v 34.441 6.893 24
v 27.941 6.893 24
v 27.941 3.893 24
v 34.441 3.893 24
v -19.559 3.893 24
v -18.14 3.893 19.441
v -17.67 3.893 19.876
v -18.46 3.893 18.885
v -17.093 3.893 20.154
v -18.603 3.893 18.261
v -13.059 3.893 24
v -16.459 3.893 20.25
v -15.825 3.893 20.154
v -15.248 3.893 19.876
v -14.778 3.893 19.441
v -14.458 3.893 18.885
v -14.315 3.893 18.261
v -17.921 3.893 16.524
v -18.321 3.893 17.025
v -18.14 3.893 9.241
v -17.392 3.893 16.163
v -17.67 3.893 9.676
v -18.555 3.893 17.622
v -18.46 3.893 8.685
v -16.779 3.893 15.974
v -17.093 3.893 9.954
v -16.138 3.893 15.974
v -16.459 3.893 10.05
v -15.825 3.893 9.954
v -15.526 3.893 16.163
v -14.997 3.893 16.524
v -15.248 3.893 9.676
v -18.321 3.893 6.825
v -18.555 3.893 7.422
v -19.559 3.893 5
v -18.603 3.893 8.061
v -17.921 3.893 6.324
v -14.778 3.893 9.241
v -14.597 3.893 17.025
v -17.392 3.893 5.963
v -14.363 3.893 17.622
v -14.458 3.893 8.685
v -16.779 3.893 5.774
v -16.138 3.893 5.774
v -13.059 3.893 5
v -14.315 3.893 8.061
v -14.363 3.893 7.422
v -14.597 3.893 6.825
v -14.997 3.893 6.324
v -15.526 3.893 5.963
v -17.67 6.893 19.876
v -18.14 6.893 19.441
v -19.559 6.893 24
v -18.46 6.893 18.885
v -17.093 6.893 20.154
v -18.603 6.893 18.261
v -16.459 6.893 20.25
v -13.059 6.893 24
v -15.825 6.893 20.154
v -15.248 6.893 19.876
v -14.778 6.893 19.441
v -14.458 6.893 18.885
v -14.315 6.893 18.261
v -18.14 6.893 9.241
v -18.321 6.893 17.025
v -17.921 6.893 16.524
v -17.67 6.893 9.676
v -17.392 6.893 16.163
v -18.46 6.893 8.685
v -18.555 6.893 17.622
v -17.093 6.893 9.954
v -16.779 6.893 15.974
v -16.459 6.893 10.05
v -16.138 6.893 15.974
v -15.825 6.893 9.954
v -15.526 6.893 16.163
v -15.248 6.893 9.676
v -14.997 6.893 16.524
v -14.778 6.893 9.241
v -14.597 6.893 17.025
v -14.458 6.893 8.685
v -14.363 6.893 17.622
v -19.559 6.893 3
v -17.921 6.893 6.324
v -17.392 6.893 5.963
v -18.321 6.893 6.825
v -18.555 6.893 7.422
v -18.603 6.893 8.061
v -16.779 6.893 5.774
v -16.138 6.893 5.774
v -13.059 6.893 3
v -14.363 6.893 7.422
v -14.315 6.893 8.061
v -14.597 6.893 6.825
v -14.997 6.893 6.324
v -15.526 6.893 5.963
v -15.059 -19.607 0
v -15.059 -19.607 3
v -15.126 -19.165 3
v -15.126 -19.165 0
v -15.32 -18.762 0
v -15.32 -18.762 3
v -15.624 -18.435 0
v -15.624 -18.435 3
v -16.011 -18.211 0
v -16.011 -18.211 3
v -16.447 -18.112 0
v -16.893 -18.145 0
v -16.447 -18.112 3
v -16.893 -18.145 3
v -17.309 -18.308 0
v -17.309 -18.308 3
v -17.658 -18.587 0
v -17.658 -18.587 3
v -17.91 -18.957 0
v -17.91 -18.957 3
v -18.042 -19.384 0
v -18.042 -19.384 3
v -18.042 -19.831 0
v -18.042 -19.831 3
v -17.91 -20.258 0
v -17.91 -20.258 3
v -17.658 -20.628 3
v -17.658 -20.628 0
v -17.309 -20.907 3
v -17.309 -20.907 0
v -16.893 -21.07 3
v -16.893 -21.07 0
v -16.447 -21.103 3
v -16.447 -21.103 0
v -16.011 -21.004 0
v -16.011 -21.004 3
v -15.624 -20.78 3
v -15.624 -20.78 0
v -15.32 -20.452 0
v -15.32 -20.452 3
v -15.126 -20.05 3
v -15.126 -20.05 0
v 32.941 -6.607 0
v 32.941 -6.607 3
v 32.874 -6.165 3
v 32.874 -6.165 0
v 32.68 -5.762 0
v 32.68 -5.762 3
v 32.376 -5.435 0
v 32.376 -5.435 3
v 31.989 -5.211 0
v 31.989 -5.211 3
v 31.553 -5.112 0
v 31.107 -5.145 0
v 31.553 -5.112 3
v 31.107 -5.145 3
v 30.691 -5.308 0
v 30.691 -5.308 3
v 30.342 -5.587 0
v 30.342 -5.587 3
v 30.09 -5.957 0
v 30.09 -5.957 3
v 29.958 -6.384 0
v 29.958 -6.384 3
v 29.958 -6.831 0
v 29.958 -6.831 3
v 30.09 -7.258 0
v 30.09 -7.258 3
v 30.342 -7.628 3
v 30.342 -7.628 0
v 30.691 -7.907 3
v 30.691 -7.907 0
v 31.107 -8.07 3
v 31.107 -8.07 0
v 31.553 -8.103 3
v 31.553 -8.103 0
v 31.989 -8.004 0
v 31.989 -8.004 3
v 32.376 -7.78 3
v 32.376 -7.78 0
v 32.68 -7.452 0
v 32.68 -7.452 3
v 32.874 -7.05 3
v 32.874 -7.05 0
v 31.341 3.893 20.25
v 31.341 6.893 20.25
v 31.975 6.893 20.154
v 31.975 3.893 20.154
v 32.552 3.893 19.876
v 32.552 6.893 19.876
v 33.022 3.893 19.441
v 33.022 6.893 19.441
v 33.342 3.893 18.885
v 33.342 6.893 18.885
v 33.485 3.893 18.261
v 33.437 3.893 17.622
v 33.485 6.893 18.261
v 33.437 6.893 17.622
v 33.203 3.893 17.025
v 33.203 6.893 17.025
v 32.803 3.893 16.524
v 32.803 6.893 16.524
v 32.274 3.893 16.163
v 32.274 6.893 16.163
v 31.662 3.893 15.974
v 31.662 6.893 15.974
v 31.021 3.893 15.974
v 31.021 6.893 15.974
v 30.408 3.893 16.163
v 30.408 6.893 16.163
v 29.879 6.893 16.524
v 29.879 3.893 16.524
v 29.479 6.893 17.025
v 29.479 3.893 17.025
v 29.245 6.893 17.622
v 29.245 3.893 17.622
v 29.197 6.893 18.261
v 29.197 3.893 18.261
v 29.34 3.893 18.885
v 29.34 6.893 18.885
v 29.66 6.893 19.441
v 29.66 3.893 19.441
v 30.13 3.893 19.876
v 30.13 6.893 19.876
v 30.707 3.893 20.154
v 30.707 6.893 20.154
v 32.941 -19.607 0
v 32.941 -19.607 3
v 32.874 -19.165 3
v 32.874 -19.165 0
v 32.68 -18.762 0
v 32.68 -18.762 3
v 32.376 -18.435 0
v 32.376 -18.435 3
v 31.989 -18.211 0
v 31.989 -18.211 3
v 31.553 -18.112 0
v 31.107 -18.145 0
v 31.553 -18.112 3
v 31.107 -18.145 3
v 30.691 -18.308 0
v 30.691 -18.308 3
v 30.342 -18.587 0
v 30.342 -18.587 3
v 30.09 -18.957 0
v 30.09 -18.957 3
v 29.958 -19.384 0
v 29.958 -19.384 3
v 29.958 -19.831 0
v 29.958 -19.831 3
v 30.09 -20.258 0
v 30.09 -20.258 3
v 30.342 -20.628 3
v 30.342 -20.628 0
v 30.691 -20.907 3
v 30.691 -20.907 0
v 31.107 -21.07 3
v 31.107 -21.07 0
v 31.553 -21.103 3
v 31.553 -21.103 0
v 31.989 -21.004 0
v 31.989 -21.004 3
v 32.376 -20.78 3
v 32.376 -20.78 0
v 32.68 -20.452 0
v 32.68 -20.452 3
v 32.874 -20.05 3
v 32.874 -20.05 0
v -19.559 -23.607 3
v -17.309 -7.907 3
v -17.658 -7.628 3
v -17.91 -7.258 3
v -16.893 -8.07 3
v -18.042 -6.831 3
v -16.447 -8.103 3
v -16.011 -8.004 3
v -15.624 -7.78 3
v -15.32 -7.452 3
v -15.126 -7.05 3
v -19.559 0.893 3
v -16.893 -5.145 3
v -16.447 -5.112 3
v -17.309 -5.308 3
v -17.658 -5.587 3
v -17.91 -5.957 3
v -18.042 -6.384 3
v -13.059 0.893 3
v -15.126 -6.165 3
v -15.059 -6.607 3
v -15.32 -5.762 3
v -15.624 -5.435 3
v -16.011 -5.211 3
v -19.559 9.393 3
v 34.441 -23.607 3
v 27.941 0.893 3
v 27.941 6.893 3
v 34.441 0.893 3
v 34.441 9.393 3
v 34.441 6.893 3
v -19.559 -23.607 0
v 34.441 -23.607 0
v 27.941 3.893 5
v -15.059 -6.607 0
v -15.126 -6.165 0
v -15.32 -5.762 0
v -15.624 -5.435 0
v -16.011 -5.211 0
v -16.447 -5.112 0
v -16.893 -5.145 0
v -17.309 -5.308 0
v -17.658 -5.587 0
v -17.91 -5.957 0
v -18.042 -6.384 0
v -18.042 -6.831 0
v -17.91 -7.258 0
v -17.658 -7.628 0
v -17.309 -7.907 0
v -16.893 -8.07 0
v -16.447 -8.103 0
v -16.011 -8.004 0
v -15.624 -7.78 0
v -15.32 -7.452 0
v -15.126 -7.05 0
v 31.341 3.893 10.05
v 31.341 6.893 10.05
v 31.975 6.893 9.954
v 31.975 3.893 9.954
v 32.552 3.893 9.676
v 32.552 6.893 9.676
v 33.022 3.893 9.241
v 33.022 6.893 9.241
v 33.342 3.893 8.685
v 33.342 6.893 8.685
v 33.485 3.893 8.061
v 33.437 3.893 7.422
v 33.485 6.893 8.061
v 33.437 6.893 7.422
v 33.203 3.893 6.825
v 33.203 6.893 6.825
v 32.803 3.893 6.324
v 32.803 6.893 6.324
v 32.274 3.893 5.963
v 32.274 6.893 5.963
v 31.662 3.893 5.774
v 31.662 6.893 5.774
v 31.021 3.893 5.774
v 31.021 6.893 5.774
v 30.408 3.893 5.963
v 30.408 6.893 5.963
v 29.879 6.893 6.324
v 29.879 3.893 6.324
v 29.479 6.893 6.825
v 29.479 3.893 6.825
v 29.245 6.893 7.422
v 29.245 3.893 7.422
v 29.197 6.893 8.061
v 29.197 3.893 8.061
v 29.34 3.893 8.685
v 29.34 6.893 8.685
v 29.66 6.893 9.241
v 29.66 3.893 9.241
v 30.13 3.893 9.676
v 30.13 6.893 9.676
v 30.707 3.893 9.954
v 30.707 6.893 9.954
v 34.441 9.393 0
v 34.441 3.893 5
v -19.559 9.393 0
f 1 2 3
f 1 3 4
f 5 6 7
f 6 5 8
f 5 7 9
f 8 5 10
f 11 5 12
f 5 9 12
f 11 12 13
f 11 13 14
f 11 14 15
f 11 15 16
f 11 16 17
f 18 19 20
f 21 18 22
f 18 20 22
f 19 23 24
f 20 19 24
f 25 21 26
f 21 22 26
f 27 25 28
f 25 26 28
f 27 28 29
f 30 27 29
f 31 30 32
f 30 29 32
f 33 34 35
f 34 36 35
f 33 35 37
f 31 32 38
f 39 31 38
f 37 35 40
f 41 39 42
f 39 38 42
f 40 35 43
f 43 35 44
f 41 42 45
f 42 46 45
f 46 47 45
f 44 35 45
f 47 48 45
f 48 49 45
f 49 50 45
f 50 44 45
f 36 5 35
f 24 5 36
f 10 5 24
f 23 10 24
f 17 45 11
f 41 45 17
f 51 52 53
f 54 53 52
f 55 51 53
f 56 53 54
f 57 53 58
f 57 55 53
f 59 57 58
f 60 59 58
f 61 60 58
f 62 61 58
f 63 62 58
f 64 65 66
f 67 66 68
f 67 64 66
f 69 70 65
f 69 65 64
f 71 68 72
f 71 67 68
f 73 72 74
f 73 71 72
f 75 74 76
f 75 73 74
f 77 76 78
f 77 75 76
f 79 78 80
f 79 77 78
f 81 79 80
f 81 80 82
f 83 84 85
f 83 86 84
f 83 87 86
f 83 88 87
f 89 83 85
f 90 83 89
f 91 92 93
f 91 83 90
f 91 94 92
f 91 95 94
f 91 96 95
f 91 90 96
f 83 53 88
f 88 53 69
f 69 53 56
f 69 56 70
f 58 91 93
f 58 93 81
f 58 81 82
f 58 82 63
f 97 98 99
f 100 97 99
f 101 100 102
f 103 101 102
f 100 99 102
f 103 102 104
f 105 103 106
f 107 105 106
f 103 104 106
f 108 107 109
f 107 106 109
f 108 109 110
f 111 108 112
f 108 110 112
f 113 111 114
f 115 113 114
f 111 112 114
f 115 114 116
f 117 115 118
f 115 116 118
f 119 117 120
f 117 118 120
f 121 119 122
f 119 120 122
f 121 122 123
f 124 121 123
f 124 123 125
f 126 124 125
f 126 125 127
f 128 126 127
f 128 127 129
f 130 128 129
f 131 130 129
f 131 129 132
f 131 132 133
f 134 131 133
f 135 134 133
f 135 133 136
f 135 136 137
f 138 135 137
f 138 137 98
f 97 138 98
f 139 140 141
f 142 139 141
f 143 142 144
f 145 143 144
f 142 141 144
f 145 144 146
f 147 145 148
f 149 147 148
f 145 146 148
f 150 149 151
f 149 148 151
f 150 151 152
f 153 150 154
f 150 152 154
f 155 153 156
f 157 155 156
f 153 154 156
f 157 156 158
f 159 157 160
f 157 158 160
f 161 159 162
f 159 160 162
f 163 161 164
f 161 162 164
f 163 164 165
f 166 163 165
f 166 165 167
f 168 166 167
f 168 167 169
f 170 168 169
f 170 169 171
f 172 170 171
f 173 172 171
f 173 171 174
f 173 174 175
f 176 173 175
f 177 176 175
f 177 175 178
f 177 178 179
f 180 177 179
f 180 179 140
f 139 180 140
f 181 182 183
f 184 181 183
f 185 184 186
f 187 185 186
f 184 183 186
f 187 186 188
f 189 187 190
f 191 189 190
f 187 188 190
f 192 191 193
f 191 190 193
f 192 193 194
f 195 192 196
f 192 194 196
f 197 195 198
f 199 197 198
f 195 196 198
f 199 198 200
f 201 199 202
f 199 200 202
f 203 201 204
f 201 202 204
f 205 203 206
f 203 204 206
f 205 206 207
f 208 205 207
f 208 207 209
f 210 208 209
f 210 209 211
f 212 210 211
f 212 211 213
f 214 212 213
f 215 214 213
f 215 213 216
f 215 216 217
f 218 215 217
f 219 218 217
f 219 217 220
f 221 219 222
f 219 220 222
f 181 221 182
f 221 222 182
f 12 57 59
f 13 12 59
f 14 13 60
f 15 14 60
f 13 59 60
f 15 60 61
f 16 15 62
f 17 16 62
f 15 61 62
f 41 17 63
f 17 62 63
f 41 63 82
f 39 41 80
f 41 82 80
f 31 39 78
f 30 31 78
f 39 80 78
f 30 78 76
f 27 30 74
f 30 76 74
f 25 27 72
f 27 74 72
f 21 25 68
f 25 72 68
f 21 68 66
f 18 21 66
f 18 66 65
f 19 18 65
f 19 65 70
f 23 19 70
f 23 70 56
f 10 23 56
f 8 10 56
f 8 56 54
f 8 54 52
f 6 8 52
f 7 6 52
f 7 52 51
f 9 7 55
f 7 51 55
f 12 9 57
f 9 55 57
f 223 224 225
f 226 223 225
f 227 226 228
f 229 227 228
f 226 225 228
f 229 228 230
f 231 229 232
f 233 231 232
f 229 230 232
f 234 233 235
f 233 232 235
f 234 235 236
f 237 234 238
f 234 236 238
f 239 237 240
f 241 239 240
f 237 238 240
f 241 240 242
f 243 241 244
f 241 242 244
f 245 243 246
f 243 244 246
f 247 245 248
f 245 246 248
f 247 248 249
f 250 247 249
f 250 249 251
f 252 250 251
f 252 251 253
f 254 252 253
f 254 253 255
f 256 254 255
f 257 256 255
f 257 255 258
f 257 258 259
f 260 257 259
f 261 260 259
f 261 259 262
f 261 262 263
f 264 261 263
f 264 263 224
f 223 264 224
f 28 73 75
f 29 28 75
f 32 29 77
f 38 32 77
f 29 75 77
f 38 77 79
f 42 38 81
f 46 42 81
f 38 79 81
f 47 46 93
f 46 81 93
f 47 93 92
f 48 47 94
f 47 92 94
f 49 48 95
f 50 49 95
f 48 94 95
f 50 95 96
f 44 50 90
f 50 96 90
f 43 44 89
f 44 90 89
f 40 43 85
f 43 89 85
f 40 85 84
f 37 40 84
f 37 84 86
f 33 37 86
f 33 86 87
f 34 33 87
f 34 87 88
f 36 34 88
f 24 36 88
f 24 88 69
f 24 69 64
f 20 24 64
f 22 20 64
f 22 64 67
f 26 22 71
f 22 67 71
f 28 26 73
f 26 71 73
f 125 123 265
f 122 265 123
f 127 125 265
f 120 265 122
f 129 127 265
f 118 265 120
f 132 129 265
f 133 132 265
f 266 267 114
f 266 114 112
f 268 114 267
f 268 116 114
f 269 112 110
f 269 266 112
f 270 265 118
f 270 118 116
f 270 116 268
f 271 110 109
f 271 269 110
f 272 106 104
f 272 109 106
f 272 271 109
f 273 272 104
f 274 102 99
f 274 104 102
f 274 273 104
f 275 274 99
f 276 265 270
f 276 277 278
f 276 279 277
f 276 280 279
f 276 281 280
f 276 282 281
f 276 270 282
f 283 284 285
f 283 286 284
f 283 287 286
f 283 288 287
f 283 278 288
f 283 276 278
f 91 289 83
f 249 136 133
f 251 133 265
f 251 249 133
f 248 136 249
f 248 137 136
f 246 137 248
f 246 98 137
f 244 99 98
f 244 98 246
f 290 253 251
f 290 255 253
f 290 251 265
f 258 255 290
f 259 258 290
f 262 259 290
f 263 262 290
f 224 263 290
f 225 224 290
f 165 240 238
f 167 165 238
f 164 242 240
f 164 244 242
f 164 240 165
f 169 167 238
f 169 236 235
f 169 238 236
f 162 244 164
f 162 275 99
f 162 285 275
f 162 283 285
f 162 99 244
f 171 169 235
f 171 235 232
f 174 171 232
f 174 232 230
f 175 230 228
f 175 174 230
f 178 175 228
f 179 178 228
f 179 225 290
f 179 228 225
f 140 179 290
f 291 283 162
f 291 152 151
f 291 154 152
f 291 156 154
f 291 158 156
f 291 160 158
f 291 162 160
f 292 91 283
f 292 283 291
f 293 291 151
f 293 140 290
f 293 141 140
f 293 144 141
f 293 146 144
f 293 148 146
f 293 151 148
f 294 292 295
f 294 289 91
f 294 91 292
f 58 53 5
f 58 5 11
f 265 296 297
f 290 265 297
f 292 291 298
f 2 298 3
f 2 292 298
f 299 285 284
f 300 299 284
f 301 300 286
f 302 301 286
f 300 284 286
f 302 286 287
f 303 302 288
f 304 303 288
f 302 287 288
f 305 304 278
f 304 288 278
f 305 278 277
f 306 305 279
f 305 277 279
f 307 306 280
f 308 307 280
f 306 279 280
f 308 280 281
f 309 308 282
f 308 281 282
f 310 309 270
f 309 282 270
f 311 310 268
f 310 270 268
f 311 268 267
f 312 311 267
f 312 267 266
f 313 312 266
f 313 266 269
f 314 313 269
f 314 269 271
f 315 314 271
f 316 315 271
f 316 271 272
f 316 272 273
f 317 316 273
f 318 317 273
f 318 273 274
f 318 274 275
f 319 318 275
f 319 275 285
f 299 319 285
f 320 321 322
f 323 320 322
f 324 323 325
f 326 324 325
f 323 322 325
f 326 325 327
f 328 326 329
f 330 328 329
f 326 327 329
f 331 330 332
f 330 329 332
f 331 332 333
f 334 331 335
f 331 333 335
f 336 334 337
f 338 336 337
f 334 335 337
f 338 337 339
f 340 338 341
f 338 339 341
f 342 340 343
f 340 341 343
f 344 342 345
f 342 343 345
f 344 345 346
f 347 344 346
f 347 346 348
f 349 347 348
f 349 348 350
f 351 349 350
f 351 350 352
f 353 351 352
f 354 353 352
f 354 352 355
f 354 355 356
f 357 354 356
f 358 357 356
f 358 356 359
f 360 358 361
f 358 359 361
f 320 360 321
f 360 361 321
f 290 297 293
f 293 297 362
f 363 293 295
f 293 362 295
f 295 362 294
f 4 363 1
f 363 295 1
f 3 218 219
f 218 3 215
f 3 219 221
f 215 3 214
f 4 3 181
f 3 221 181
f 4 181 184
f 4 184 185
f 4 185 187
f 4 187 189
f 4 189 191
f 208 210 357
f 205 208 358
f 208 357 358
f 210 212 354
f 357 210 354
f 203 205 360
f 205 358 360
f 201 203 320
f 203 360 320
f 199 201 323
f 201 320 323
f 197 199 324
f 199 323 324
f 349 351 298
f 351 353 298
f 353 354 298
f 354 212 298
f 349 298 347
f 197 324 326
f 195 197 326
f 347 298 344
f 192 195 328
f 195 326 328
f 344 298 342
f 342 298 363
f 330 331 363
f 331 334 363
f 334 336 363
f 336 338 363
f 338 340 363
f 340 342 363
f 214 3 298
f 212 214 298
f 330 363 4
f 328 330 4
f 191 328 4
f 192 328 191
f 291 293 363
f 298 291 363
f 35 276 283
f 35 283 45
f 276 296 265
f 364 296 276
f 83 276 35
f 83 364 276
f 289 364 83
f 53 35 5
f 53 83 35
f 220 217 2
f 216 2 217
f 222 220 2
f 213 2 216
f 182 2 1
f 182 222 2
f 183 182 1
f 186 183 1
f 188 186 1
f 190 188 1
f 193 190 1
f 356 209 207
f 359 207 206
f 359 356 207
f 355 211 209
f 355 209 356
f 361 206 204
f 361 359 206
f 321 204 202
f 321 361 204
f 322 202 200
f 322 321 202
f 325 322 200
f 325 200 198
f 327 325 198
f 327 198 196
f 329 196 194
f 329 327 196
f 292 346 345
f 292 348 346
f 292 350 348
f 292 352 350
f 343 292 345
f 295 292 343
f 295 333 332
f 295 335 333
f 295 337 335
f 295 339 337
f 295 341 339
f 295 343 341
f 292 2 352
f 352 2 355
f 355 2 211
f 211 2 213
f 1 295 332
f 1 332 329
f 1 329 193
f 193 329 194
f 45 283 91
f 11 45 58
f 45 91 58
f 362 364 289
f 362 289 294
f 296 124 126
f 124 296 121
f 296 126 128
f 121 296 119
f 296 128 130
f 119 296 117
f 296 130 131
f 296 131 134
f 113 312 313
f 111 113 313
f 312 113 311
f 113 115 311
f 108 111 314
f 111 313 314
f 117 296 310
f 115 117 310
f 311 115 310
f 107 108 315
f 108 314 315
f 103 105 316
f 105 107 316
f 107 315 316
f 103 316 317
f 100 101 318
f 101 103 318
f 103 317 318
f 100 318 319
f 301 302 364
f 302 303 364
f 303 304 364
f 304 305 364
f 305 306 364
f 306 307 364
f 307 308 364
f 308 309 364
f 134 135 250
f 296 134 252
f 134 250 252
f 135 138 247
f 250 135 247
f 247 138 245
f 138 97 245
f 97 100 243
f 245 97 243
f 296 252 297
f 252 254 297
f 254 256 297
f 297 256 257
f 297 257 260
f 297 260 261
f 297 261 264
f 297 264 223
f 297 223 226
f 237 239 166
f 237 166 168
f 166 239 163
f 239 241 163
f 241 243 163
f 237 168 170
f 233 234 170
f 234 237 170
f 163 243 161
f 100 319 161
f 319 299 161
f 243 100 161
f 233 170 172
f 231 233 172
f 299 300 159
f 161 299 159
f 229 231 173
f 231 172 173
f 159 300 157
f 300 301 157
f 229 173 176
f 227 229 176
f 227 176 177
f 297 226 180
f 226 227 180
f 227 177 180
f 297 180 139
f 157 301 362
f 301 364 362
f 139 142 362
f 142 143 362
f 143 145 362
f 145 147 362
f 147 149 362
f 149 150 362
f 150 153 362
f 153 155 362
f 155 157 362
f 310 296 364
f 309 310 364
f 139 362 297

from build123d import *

# Parameters (mm, degrees)
SKETCH1_W           = 54
SKETCH1_H           = 33
BOSS_EXTRUDE1_DEPTH = 3
SKETCH3_W           = 6.5
SKETCH3_H           = 3
BOSS_EXTRUDE2_DEPTH = 21
SKETCH5_R           = 2.15
CUT_EXTRUDE1_DEPTH  = 3
SKETCH6_R           = 1.5
CUT_EXTRUDE2_DEPTH  = 10
BOSS_EXTRUDE3_DEPTH = 6.5
BOSS_EXTRUDE4_DEPTH = 6.5


with BuildPart() as part:
    # Sketch1 → Boss-Extrude1 (new body)
    with BuildSketch(Plane.XY):
        with Locations((7.441119081, -7.107474474)):
            Rectangle(SKETCH1_W, SKETCH1_H)
    extrude(amount=BOSS_EXTRUDE1_DEPTH)

    # Sketch3 → Boss-Extrude2 (add)
    with BuildSketch(Plane.XY.offset(3)):
        with Locations((31.191119081, 5.392525526)):
            Rectangle(SKETCH3_W, SKETCH3_H)
        with Locations((-16.308880919, 5.392525526)):
            Rectangle(SKETCH3_W, SKETCH3_H)
    extrude(amount=BOSS_EXTRUDE2_DEPTH)

    # Sketch5 → Cut-Extrude1 (cut)
    with BuildSketch(Plane(origin=(0, 6.892525526, 0), x_dir=(1, 0, 0), z_dir=(0, 1, 0))):
        with Locations(Location((31.341119081, -18.1, 0), (0, 0, 270))):
            Circle(SKETCH5_R)
        with Locations(Location((31.341119081, -7.9, 0), (0, 0, 270))):
            Circle(SKETCH5_R)
        with Locations(Location((-16.458880919, -18.1, 0), (0, 0, 270))):
            Circle(SKETCH5_R)
        with Locations(Location((-16.458880919, -7.9, 0), (0, 0, 270))):
            Circle(SKETCH5_R)
    extrude(amount=-CUT_EXTRUDE1_DEPTH, mode=Mode.SUBTRACT)

    # Sketch6 → Cut-Extrude2 (cut)
    with BuildSketch(Plane.XY.offset(3)):
        with Locations((31.441119081, -19.607474474)):
            Circle(SKETCH6_R)
        with Locations((-16.558880919, -19.607474474)):
            Circle(SKETCH6_R)
        with Locations((-16.558880919, -6.607474474)):
            Circle(SKETCH6_R)
        with Locations((31.441119081, -6.607474474)):
            Circle(SKETCH6_R)
    extrude(amount=-CUT_EXTRUDE2_DEPTH, mode=Mode.SUBTRACT)

    # Sketch7 → Boss-Extrude3 (add)
    with BuildSketch(Plane(origin=(34.441119081, 0, 0), x_dir=(0, 0, -1), z_dir=(1, 0, 0))):
        Polygon((-5, 3.892525526), (-3, 3.892525526), (-3, 0.892525526), align=None)
    extrude(amount=-BOSS_EXTRUDE3_DEPTH)

    # Sketch8 → Boss-Extrude4 (add)
    with BuildSketch(Plane.ZY.offset(19.558880919)):
        Polygon((5, 3.892525526), (3, 3.892525526), (3, 0.892525526), align=None)
    extrude(amount=-BOSS_EXTRUDE4_DEPTH)


solid = part.part
